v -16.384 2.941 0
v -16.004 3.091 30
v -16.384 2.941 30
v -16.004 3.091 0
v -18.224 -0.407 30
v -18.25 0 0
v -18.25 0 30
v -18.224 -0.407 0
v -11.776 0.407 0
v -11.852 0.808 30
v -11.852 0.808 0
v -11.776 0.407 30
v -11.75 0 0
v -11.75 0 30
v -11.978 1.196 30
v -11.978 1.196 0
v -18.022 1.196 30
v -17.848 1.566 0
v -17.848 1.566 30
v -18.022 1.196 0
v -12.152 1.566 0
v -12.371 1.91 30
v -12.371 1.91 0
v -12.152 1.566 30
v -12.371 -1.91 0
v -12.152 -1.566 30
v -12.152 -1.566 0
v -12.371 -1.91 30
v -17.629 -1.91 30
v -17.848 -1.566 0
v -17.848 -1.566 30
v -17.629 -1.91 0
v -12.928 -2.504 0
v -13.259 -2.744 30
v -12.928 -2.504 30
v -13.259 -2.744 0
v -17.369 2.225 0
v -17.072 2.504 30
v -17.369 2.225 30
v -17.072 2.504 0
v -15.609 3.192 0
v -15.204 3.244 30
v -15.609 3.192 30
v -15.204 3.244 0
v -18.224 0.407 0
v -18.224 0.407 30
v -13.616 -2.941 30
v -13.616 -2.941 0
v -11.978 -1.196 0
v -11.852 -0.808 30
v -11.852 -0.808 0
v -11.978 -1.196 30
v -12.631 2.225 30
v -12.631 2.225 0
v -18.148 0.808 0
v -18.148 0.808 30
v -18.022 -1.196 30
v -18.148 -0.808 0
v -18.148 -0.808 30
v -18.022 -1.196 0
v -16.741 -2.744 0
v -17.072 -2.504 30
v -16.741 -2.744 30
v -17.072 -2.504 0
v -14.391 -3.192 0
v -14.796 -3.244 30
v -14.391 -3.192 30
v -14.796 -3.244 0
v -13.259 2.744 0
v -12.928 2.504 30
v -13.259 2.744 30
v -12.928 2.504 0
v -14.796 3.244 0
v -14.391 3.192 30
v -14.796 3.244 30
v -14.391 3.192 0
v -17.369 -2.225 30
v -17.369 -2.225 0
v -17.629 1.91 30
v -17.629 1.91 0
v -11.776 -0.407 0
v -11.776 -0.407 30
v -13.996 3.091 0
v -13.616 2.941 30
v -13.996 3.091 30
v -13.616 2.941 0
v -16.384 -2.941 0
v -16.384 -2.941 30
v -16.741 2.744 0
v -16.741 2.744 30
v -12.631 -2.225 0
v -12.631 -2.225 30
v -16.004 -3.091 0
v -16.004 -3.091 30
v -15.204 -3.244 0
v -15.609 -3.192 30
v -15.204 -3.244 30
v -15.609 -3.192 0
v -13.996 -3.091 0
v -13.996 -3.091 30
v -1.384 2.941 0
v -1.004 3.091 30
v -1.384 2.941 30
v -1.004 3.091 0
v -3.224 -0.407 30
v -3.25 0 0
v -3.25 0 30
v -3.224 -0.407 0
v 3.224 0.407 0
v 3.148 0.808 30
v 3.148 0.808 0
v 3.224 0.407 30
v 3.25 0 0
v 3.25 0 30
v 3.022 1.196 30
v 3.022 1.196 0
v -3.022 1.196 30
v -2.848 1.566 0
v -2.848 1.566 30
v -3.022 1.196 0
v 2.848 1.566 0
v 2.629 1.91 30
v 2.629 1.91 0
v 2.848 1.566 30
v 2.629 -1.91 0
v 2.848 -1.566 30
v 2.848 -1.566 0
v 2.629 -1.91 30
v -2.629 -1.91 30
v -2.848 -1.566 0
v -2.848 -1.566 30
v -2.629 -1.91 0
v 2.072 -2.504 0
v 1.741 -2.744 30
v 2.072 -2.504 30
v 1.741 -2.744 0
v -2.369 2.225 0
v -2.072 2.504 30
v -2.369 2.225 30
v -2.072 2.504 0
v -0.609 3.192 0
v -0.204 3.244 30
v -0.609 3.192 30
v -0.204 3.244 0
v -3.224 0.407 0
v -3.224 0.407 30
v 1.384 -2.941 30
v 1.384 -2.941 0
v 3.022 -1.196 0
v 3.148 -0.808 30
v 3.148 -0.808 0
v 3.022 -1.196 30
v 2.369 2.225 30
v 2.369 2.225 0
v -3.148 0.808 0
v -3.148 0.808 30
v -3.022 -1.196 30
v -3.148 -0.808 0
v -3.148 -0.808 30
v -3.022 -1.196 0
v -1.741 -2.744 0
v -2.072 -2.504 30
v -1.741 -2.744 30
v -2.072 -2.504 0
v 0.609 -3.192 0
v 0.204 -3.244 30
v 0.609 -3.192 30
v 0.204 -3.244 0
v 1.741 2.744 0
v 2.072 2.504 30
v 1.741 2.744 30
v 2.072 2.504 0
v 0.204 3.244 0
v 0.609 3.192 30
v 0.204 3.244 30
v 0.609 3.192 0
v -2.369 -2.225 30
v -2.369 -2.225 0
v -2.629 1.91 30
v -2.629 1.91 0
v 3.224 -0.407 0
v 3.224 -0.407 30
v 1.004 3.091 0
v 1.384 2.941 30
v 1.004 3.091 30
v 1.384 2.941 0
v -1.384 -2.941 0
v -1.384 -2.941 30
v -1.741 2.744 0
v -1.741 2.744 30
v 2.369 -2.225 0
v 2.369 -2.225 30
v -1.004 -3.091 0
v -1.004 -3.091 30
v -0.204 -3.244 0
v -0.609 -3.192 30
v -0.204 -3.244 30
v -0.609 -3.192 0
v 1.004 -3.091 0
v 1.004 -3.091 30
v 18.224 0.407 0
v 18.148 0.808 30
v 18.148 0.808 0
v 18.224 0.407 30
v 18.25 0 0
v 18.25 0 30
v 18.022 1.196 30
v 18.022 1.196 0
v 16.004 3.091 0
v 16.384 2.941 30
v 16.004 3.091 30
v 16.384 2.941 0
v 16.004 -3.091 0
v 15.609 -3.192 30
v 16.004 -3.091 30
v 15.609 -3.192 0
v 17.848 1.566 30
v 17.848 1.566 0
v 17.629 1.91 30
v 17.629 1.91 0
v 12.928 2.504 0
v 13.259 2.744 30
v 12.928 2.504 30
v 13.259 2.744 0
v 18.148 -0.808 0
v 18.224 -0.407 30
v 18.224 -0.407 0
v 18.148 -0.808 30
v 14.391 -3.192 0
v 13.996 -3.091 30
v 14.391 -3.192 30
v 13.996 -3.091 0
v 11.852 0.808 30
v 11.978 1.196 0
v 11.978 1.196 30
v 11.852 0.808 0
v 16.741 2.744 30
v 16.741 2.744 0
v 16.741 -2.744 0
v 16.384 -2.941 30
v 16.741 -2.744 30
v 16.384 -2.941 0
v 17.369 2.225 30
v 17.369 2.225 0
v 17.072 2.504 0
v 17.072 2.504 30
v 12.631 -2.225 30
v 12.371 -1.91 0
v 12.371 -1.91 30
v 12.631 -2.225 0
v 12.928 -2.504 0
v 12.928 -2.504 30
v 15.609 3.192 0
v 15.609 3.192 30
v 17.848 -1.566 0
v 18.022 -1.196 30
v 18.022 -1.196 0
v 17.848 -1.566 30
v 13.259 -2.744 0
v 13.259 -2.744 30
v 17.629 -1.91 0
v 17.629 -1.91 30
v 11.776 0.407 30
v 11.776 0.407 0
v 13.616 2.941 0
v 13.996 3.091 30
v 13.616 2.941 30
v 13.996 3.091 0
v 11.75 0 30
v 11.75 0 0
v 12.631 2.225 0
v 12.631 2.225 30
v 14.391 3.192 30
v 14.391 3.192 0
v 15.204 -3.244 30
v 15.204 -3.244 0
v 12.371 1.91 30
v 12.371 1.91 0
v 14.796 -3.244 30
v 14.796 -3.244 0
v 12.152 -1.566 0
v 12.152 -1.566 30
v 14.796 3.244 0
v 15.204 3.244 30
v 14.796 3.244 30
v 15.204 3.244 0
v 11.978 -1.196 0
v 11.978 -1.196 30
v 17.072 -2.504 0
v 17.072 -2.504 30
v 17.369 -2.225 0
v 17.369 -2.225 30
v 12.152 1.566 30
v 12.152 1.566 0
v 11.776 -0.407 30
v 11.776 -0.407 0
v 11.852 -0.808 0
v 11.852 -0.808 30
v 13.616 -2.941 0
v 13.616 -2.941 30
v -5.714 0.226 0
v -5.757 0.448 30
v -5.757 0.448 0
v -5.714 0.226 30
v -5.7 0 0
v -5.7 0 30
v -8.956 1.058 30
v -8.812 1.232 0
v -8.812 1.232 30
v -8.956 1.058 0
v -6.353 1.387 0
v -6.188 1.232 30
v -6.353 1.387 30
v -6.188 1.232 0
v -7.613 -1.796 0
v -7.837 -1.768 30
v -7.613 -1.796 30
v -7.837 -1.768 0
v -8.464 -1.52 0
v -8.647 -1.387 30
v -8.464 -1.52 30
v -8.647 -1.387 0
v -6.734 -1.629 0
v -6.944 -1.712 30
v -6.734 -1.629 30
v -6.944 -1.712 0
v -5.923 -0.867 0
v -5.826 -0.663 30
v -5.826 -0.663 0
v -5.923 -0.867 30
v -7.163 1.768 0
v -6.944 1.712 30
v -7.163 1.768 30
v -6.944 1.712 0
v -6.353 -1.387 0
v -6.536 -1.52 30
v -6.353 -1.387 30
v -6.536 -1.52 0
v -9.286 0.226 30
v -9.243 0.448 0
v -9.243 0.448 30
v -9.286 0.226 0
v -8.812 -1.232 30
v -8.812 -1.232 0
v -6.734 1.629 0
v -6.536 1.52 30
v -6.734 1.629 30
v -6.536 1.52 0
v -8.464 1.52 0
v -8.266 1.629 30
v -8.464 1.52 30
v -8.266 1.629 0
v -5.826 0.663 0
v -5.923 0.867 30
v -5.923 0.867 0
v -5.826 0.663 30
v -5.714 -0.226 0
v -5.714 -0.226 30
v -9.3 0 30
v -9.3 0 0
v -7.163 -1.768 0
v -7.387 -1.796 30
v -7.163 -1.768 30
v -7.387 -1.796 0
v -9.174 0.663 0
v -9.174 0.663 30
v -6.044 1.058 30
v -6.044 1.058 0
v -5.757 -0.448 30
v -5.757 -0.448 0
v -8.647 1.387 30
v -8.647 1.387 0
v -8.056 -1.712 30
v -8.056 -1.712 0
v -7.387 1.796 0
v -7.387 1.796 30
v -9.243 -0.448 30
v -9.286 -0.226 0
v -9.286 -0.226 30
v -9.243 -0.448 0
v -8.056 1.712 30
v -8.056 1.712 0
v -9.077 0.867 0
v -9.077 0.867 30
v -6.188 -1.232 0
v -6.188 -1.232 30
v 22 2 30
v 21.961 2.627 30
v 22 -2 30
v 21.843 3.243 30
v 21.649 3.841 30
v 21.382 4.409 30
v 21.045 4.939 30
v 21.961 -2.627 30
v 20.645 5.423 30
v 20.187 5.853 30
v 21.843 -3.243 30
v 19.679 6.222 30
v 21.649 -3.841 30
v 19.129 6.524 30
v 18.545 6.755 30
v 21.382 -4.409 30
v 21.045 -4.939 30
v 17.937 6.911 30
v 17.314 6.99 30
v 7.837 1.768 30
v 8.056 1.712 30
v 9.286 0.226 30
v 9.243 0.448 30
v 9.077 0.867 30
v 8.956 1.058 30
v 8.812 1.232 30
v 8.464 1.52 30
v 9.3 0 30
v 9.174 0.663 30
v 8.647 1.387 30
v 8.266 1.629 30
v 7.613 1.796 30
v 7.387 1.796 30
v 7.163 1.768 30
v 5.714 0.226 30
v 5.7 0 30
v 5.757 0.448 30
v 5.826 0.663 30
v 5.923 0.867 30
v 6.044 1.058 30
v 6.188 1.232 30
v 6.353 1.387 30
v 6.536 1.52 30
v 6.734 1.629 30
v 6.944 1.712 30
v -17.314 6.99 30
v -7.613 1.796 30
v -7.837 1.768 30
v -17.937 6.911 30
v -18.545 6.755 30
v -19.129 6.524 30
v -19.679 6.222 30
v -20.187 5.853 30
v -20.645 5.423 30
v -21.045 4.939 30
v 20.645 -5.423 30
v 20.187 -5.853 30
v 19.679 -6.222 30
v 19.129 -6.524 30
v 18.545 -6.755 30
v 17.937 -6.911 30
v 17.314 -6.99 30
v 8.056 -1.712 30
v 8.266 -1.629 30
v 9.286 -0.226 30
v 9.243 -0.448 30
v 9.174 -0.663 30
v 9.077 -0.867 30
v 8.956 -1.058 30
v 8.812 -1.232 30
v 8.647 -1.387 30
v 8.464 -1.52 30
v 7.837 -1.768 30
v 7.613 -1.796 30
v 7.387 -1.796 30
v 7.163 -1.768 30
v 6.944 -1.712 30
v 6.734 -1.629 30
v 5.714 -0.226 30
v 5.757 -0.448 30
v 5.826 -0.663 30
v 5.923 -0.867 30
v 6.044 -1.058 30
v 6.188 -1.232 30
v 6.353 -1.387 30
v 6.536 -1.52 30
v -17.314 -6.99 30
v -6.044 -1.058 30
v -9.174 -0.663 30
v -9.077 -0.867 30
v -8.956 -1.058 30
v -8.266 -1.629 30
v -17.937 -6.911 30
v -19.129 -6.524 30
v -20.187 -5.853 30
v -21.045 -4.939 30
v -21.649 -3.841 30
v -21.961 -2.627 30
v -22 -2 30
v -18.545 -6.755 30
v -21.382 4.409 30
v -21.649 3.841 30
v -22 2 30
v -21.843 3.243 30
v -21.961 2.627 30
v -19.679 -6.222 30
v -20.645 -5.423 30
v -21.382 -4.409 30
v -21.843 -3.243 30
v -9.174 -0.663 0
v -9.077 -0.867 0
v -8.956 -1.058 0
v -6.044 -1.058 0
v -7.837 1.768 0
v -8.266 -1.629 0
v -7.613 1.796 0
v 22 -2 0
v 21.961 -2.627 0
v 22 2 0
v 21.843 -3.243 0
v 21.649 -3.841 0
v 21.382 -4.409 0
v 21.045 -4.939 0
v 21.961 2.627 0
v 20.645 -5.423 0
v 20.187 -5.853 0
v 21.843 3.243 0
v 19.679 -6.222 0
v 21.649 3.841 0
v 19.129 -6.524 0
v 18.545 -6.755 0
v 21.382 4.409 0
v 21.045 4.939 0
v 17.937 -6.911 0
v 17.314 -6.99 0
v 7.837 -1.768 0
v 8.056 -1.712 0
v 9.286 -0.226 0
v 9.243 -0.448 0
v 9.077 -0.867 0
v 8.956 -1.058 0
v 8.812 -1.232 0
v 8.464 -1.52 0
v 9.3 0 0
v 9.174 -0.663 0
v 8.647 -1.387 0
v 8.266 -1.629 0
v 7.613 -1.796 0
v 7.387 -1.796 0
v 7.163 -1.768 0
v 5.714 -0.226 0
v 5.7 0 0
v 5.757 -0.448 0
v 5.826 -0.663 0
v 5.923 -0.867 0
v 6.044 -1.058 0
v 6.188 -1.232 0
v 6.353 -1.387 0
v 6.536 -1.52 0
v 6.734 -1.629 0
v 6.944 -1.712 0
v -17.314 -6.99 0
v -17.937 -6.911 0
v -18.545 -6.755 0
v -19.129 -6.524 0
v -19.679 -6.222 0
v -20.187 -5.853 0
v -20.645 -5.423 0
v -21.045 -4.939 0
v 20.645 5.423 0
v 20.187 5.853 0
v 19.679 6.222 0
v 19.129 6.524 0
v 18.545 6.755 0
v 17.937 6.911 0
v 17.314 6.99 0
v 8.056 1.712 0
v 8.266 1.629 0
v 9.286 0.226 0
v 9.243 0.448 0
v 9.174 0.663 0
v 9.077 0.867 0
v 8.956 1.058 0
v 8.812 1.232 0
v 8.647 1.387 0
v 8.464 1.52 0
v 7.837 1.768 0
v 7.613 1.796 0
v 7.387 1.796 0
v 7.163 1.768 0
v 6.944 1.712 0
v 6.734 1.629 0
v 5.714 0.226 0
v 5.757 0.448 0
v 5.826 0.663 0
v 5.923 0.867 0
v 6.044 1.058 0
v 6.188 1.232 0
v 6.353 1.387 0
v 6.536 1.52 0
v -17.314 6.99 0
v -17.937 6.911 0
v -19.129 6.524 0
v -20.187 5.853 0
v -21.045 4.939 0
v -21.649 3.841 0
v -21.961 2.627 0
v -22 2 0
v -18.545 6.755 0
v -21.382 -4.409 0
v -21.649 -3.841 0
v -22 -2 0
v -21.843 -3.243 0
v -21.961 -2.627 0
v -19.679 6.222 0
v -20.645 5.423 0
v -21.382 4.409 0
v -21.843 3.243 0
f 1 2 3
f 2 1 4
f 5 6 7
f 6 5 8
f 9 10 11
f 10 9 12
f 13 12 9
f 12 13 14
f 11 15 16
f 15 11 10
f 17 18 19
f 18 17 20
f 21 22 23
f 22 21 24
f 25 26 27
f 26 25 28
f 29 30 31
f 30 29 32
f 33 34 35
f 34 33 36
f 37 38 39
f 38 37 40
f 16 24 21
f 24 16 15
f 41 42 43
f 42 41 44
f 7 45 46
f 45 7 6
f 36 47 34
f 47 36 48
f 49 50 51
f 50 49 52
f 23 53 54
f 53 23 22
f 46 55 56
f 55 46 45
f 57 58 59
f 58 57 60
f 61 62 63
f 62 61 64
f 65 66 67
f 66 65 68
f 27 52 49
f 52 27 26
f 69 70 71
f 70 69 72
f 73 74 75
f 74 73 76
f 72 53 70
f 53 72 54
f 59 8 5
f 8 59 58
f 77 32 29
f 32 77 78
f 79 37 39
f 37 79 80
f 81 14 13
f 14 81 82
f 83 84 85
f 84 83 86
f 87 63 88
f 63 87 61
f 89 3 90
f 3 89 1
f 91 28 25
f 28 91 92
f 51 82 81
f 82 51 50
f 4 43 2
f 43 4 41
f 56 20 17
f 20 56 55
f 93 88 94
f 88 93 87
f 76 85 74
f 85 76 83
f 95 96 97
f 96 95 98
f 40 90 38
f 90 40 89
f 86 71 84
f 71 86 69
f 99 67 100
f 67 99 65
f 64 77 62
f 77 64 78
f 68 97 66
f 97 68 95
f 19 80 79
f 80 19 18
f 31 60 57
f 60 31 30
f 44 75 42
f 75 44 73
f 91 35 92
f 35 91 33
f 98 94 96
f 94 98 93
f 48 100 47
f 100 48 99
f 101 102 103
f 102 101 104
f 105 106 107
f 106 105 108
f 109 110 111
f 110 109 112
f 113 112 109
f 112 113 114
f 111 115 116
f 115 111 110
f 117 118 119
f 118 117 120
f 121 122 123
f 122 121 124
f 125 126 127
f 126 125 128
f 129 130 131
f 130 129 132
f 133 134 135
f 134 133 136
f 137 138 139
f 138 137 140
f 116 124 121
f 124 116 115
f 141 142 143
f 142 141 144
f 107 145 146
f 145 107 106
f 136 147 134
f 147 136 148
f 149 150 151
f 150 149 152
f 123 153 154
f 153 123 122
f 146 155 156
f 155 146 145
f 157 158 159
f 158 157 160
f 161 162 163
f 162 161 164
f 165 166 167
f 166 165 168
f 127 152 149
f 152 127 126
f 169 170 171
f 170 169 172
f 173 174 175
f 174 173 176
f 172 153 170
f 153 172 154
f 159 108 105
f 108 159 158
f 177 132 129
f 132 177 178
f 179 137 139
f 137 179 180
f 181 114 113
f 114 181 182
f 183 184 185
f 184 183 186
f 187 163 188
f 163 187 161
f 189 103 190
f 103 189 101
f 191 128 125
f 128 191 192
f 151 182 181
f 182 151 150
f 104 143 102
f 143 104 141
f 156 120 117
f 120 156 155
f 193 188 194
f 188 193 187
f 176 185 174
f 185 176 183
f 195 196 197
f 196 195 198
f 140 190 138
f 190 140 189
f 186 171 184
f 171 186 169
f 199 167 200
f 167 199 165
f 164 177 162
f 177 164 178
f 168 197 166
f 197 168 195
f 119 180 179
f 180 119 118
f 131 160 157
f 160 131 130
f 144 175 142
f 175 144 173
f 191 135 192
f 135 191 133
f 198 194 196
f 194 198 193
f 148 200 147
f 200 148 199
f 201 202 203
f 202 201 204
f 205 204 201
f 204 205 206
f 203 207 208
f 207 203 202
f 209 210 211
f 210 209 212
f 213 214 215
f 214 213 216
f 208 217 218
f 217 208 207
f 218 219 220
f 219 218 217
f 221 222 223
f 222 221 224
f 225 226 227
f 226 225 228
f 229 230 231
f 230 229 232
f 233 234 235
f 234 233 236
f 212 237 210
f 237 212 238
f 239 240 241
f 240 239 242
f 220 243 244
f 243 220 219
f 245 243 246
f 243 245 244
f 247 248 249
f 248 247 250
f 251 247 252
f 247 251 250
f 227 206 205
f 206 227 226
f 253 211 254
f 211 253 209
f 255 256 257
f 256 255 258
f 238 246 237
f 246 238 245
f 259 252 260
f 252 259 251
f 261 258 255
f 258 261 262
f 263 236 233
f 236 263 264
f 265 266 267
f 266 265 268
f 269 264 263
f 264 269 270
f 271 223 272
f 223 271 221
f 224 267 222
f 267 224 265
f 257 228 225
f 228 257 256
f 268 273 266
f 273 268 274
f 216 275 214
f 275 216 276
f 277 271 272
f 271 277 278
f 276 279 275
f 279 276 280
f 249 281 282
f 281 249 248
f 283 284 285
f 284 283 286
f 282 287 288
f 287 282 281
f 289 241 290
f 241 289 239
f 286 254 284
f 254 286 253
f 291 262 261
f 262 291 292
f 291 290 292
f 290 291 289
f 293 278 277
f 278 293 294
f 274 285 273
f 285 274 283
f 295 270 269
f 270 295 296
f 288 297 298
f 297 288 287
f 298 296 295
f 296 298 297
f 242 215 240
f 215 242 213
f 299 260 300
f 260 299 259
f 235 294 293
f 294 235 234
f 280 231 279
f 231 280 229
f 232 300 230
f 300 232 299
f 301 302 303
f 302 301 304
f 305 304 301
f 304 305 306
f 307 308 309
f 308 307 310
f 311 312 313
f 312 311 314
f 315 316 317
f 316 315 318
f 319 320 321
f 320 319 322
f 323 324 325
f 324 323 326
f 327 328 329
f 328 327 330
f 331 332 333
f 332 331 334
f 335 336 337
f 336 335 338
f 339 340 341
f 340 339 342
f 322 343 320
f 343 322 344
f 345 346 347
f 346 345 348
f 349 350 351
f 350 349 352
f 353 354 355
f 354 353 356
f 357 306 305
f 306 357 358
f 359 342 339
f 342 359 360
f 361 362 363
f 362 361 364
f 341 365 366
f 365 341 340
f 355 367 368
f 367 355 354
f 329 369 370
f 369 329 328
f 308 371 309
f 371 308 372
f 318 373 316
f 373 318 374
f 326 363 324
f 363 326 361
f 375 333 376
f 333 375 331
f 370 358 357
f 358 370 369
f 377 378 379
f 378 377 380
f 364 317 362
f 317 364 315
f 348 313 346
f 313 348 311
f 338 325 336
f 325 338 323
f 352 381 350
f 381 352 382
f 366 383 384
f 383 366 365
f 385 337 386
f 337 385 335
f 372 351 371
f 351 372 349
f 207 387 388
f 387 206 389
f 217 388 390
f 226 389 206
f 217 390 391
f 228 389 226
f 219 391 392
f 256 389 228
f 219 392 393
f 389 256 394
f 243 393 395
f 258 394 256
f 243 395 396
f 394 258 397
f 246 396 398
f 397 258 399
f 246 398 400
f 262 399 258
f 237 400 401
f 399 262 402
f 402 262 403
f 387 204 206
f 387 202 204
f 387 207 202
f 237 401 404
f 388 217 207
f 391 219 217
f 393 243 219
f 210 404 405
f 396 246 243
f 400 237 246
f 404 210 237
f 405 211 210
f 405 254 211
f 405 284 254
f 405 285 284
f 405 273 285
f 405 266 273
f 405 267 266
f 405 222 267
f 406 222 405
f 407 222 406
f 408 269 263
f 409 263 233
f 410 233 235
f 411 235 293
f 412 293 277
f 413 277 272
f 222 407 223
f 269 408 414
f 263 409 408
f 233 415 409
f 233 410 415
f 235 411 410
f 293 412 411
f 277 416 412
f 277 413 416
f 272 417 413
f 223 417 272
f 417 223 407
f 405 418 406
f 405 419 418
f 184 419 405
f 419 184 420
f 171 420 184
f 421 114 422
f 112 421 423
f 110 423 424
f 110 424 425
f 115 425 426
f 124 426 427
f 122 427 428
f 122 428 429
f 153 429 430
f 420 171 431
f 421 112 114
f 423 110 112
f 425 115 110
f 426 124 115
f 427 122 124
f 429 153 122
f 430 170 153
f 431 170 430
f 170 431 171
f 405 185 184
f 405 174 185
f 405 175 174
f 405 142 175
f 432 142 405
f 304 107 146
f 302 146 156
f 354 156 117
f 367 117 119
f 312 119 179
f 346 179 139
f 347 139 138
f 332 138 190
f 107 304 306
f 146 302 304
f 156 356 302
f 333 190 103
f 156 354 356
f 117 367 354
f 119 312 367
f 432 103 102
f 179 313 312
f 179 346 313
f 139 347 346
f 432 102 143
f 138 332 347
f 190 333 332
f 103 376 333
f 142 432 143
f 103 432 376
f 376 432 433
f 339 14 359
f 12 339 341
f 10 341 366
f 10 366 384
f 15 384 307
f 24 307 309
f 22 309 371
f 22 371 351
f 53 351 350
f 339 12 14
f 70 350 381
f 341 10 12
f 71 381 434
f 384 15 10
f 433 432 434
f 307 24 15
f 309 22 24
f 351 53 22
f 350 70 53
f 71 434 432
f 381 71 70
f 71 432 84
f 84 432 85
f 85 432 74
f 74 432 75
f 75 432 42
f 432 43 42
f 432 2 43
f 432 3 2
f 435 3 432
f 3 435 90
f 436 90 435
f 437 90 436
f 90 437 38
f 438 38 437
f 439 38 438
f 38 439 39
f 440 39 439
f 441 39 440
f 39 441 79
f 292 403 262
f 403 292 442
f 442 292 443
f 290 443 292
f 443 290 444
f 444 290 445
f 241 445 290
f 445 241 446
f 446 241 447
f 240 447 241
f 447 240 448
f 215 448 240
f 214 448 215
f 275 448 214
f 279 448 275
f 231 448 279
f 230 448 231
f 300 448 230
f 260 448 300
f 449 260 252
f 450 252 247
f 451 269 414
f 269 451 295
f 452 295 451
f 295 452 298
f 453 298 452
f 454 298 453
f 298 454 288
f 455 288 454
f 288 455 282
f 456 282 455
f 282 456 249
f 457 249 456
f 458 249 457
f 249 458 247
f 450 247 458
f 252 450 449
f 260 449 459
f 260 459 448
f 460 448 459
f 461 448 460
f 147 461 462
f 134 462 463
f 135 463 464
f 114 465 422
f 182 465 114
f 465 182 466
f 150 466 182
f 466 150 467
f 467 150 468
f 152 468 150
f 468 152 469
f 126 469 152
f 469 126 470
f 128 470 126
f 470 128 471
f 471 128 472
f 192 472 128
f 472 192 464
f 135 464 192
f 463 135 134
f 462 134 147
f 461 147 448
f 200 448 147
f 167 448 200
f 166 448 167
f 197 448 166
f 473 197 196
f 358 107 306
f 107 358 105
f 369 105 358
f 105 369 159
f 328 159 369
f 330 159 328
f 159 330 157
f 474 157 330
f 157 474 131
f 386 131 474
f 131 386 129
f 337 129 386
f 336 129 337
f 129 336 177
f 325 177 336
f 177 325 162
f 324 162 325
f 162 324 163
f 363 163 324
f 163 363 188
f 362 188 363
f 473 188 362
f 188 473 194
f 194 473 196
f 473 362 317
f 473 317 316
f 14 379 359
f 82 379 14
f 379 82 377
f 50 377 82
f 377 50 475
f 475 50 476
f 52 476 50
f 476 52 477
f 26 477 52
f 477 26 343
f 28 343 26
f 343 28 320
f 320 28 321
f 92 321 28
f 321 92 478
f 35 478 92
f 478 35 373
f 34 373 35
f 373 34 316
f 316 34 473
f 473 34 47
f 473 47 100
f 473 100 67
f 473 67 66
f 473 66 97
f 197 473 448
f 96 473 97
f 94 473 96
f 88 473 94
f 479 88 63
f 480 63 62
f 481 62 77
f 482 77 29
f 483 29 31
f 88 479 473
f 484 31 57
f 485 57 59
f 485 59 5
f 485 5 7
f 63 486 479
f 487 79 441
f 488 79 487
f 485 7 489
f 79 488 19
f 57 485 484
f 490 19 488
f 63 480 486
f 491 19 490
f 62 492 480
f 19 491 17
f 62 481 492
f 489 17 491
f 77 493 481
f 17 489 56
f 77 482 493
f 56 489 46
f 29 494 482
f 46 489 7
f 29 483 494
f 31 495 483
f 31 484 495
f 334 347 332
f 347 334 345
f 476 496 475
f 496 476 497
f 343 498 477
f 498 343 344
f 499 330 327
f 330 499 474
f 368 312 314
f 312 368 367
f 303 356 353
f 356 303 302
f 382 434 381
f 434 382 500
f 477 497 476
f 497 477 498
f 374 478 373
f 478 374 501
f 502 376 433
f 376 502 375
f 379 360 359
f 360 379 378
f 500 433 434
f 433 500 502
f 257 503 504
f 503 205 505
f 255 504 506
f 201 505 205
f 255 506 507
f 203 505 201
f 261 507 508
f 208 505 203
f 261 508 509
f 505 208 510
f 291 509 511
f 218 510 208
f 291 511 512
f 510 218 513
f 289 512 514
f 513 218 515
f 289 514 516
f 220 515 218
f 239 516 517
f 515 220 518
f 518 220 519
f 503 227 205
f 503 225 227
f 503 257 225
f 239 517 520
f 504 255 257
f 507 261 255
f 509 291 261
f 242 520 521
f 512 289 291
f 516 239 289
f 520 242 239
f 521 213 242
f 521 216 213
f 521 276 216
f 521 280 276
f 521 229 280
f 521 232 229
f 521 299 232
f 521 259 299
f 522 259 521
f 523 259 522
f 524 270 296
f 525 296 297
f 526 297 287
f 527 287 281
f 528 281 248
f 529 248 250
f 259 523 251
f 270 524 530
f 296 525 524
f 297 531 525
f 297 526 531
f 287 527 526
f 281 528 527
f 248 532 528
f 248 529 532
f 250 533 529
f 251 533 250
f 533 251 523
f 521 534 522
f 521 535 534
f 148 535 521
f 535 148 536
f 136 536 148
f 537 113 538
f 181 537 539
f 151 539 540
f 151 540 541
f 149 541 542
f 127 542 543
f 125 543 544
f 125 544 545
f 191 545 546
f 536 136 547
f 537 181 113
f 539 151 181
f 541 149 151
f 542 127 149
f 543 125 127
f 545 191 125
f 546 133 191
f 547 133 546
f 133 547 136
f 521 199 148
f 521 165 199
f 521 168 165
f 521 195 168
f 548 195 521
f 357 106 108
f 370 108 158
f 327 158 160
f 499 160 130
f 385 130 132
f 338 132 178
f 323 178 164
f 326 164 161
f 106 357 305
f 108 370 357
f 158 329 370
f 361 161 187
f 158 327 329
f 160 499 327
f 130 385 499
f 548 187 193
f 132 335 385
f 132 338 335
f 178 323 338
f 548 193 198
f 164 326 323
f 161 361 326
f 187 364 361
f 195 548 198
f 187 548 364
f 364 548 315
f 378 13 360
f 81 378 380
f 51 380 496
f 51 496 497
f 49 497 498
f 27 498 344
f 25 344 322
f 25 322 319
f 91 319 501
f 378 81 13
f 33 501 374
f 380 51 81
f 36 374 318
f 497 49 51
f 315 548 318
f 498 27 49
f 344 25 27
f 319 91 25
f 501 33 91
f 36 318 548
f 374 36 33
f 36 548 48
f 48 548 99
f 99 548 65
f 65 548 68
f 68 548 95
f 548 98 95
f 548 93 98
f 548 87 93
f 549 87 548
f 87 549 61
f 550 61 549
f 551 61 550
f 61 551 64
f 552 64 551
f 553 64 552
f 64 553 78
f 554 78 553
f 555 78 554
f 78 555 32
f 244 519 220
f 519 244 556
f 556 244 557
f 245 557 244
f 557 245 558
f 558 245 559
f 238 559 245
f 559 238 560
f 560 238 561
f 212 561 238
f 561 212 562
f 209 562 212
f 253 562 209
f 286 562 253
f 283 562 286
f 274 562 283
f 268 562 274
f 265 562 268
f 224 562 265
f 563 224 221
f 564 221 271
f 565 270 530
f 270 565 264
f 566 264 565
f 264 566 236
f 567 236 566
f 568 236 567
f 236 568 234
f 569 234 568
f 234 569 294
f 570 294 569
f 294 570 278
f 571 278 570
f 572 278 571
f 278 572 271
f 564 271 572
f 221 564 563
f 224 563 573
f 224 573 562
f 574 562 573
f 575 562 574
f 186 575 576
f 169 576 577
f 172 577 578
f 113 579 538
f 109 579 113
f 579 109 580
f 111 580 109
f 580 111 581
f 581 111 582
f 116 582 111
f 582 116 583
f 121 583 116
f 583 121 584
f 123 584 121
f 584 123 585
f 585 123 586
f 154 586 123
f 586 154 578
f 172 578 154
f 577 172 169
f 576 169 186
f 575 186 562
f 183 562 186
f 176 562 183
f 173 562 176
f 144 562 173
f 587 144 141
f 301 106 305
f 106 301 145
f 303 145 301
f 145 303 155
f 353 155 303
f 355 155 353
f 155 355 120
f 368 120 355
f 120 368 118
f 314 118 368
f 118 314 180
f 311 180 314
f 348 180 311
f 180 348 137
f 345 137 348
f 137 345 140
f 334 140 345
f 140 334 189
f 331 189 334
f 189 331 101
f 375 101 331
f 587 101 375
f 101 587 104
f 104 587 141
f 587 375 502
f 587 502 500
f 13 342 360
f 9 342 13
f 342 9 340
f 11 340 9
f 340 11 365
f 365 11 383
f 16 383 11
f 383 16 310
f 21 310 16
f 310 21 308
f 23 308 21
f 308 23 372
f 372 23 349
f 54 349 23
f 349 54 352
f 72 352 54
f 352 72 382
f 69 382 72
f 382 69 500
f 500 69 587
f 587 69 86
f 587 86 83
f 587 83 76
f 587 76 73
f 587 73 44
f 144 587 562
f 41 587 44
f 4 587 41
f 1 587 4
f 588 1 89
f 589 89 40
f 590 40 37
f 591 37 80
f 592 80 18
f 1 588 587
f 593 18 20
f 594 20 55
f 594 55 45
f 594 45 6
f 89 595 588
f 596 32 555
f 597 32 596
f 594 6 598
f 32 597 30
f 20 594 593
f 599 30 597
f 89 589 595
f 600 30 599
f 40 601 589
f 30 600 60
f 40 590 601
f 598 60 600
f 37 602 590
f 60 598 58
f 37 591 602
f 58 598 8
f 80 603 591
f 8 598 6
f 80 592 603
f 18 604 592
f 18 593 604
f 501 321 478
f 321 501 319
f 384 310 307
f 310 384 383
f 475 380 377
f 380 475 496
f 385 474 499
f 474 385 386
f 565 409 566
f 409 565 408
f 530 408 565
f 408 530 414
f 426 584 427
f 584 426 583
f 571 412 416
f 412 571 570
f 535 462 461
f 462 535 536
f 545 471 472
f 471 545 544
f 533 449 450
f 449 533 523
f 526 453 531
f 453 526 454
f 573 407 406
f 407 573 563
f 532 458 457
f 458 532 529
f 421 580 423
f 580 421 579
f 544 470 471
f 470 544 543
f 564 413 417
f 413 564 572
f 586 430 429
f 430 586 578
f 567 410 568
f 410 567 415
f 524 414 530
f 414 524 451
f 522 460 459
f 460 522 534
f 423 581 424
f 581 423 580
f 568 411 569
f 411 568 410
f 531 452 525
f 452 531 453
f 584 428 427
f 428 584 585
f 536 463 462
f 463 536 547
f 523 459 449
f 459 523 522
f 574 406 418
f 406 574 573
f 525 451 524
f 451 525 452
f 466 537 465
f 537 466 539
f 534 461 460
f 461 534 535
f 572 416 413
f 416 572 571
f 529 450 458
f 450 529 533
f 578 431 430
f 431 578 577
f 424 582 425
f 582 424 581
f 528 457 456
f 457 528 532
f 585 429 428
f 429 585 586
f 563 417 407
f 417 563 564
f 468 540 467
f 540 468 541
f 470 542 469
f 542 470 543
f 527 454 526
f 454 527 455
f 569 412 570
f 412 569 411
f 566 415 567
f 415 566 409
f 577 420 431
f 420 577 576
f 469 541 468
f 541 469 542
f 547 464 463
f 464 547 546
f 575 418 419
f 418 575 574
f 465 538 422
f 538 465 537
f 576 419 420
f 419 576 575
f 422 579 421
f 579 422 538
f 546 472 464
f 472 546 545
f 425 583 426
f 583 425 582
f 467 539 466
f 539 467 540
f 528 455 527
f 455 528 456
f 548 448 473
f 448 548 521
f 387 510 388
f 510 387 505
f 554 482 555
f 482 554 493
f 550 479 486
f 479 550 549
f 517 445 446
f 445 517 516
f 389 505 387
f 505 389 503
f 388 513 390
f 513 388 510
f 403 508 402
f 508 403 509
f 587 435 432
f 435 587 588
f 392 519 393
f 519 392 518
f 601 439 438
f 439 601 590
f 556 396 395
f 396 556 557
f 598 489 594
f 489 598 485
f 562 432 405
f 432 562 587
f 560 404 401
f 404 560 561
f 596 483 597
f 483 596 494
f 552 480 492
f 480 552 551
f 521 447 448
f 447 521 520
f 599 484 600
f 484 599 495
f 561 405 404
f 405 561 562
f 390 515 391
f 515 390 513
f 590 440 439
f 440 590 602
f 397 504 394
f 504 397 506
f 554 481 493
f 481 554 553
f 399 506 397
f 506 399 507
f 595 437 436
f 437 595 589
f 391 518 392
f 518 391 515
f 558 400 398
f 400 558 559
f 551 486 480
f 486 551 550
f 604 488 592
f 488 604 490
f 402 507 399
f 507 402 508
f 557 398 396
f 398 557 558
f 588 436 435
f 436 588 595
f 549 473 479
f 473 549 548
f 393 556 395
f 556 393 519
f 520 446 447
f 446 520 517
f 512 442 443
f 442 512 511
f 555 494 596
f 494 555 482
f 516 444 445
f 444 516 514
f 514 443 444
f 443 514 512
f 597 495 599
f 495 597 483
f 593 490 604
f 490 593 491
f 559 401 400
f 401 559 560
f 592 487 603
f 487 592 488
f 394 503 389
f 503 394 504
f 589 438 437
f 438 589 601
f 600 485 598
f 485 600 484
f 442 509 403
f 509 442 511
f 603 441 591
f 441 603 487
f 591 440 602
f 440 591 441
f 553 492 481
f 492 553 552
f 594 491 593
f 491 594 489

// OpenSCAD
$fn = 50;


difference() {
	union() {
		hull() {
			translate(v = [-17.0000000000, 2.0000000000, 0]) {
				cylinder(h = 30, r = 5);
			}
			translate(v = [17.0000000000, 2.0000000000, 0]) {
				cylinder(h = 30, r = 5);
			}
			translate(v = [-17.0000000000, -2.0000000000, 0]) {
				cylinder(h = 30, r = 5);
			}
			translate(v = [17.0000000000, -2.0000000000, 0]) {
				cylinder(h = 30, r = 5);
			}
		}
	}
	union() {
		translate(v = [-15.0000000000, 0.0000000000, -100.0000000000]) {
			cylinder(h = 200, r = 3.2500000000);
		}
		translate(v = [0.0000000000, 0.0000000000, -100.0000000000]) {
			cylinder(h = 200, r = 3.2500000000);
		}
		translate(v = [15.0000000000, 0.0000000000, -100.0000000000]) {
			cylinder(h = 200, r = 3.2500000000);
		}
		translate(v = [-15.0000000000, 0.0000000000, 0]) {
			cylinder(h = 30, r = 1.8000000000);
		}
		translate(v = [-7.5000000000, 0.0000000000, 0]) {
			cylinder(h = 30, r = 1.8000000000);
		}
		cylinder(h = 30, r = 1.8000000000);
		translate(v = [7.5000000000, 0.0000000000, 0]) {
			cylinder(h = 30, r = 1.8000000000);
		}
		translate(v = [15.0000000000, 0.0000000000, 0]) {
			cylinder(h = 30, r = 1.8000000000);
		}
		translate(v = [-15.0000000000, 0.0000000000, 0]) {
			cylinder(h = 30, r = 1.8000000000);
		}
		translate(v = [-7.5000000000, 0.0000000000, 0]) {
			cylinder(h = 30, r = 1.8000000000);
		}
		cylinder(h = 30, r = 1.8000000000);
		translate(v = [7.5000000000, 0.0000000000, 0]) {
			cylinder(h = 30, r = 1.8000000000);
		}
		translate(v = [15.0000000000, 0.0000000000, 0]) {
			cylinder(h = 30, r = 1.8000000000);
		}
		translate(v = [-15.0000000000, 0.0000000000, 0]) {
			cylinder(h = 30, r = 1.8000000000);
		}
		translate(v = [-7.5000000000, 0.0000000000, 0]) {
			cylinder(h = 30, r = 1.8000000000);
		}
		cylinder(h = 30, r = 1.8000000000);
		translate(v = [7.5000000000, 0.0000000000, 0]) {
			cylinder(h = 30, r = 1.8000000000);
		}
		translate(v = [15.0000000000, 0.0000000000, 0]) {
			cylinder(h = 30, r = 1.8000000000);
		}
	}
}
